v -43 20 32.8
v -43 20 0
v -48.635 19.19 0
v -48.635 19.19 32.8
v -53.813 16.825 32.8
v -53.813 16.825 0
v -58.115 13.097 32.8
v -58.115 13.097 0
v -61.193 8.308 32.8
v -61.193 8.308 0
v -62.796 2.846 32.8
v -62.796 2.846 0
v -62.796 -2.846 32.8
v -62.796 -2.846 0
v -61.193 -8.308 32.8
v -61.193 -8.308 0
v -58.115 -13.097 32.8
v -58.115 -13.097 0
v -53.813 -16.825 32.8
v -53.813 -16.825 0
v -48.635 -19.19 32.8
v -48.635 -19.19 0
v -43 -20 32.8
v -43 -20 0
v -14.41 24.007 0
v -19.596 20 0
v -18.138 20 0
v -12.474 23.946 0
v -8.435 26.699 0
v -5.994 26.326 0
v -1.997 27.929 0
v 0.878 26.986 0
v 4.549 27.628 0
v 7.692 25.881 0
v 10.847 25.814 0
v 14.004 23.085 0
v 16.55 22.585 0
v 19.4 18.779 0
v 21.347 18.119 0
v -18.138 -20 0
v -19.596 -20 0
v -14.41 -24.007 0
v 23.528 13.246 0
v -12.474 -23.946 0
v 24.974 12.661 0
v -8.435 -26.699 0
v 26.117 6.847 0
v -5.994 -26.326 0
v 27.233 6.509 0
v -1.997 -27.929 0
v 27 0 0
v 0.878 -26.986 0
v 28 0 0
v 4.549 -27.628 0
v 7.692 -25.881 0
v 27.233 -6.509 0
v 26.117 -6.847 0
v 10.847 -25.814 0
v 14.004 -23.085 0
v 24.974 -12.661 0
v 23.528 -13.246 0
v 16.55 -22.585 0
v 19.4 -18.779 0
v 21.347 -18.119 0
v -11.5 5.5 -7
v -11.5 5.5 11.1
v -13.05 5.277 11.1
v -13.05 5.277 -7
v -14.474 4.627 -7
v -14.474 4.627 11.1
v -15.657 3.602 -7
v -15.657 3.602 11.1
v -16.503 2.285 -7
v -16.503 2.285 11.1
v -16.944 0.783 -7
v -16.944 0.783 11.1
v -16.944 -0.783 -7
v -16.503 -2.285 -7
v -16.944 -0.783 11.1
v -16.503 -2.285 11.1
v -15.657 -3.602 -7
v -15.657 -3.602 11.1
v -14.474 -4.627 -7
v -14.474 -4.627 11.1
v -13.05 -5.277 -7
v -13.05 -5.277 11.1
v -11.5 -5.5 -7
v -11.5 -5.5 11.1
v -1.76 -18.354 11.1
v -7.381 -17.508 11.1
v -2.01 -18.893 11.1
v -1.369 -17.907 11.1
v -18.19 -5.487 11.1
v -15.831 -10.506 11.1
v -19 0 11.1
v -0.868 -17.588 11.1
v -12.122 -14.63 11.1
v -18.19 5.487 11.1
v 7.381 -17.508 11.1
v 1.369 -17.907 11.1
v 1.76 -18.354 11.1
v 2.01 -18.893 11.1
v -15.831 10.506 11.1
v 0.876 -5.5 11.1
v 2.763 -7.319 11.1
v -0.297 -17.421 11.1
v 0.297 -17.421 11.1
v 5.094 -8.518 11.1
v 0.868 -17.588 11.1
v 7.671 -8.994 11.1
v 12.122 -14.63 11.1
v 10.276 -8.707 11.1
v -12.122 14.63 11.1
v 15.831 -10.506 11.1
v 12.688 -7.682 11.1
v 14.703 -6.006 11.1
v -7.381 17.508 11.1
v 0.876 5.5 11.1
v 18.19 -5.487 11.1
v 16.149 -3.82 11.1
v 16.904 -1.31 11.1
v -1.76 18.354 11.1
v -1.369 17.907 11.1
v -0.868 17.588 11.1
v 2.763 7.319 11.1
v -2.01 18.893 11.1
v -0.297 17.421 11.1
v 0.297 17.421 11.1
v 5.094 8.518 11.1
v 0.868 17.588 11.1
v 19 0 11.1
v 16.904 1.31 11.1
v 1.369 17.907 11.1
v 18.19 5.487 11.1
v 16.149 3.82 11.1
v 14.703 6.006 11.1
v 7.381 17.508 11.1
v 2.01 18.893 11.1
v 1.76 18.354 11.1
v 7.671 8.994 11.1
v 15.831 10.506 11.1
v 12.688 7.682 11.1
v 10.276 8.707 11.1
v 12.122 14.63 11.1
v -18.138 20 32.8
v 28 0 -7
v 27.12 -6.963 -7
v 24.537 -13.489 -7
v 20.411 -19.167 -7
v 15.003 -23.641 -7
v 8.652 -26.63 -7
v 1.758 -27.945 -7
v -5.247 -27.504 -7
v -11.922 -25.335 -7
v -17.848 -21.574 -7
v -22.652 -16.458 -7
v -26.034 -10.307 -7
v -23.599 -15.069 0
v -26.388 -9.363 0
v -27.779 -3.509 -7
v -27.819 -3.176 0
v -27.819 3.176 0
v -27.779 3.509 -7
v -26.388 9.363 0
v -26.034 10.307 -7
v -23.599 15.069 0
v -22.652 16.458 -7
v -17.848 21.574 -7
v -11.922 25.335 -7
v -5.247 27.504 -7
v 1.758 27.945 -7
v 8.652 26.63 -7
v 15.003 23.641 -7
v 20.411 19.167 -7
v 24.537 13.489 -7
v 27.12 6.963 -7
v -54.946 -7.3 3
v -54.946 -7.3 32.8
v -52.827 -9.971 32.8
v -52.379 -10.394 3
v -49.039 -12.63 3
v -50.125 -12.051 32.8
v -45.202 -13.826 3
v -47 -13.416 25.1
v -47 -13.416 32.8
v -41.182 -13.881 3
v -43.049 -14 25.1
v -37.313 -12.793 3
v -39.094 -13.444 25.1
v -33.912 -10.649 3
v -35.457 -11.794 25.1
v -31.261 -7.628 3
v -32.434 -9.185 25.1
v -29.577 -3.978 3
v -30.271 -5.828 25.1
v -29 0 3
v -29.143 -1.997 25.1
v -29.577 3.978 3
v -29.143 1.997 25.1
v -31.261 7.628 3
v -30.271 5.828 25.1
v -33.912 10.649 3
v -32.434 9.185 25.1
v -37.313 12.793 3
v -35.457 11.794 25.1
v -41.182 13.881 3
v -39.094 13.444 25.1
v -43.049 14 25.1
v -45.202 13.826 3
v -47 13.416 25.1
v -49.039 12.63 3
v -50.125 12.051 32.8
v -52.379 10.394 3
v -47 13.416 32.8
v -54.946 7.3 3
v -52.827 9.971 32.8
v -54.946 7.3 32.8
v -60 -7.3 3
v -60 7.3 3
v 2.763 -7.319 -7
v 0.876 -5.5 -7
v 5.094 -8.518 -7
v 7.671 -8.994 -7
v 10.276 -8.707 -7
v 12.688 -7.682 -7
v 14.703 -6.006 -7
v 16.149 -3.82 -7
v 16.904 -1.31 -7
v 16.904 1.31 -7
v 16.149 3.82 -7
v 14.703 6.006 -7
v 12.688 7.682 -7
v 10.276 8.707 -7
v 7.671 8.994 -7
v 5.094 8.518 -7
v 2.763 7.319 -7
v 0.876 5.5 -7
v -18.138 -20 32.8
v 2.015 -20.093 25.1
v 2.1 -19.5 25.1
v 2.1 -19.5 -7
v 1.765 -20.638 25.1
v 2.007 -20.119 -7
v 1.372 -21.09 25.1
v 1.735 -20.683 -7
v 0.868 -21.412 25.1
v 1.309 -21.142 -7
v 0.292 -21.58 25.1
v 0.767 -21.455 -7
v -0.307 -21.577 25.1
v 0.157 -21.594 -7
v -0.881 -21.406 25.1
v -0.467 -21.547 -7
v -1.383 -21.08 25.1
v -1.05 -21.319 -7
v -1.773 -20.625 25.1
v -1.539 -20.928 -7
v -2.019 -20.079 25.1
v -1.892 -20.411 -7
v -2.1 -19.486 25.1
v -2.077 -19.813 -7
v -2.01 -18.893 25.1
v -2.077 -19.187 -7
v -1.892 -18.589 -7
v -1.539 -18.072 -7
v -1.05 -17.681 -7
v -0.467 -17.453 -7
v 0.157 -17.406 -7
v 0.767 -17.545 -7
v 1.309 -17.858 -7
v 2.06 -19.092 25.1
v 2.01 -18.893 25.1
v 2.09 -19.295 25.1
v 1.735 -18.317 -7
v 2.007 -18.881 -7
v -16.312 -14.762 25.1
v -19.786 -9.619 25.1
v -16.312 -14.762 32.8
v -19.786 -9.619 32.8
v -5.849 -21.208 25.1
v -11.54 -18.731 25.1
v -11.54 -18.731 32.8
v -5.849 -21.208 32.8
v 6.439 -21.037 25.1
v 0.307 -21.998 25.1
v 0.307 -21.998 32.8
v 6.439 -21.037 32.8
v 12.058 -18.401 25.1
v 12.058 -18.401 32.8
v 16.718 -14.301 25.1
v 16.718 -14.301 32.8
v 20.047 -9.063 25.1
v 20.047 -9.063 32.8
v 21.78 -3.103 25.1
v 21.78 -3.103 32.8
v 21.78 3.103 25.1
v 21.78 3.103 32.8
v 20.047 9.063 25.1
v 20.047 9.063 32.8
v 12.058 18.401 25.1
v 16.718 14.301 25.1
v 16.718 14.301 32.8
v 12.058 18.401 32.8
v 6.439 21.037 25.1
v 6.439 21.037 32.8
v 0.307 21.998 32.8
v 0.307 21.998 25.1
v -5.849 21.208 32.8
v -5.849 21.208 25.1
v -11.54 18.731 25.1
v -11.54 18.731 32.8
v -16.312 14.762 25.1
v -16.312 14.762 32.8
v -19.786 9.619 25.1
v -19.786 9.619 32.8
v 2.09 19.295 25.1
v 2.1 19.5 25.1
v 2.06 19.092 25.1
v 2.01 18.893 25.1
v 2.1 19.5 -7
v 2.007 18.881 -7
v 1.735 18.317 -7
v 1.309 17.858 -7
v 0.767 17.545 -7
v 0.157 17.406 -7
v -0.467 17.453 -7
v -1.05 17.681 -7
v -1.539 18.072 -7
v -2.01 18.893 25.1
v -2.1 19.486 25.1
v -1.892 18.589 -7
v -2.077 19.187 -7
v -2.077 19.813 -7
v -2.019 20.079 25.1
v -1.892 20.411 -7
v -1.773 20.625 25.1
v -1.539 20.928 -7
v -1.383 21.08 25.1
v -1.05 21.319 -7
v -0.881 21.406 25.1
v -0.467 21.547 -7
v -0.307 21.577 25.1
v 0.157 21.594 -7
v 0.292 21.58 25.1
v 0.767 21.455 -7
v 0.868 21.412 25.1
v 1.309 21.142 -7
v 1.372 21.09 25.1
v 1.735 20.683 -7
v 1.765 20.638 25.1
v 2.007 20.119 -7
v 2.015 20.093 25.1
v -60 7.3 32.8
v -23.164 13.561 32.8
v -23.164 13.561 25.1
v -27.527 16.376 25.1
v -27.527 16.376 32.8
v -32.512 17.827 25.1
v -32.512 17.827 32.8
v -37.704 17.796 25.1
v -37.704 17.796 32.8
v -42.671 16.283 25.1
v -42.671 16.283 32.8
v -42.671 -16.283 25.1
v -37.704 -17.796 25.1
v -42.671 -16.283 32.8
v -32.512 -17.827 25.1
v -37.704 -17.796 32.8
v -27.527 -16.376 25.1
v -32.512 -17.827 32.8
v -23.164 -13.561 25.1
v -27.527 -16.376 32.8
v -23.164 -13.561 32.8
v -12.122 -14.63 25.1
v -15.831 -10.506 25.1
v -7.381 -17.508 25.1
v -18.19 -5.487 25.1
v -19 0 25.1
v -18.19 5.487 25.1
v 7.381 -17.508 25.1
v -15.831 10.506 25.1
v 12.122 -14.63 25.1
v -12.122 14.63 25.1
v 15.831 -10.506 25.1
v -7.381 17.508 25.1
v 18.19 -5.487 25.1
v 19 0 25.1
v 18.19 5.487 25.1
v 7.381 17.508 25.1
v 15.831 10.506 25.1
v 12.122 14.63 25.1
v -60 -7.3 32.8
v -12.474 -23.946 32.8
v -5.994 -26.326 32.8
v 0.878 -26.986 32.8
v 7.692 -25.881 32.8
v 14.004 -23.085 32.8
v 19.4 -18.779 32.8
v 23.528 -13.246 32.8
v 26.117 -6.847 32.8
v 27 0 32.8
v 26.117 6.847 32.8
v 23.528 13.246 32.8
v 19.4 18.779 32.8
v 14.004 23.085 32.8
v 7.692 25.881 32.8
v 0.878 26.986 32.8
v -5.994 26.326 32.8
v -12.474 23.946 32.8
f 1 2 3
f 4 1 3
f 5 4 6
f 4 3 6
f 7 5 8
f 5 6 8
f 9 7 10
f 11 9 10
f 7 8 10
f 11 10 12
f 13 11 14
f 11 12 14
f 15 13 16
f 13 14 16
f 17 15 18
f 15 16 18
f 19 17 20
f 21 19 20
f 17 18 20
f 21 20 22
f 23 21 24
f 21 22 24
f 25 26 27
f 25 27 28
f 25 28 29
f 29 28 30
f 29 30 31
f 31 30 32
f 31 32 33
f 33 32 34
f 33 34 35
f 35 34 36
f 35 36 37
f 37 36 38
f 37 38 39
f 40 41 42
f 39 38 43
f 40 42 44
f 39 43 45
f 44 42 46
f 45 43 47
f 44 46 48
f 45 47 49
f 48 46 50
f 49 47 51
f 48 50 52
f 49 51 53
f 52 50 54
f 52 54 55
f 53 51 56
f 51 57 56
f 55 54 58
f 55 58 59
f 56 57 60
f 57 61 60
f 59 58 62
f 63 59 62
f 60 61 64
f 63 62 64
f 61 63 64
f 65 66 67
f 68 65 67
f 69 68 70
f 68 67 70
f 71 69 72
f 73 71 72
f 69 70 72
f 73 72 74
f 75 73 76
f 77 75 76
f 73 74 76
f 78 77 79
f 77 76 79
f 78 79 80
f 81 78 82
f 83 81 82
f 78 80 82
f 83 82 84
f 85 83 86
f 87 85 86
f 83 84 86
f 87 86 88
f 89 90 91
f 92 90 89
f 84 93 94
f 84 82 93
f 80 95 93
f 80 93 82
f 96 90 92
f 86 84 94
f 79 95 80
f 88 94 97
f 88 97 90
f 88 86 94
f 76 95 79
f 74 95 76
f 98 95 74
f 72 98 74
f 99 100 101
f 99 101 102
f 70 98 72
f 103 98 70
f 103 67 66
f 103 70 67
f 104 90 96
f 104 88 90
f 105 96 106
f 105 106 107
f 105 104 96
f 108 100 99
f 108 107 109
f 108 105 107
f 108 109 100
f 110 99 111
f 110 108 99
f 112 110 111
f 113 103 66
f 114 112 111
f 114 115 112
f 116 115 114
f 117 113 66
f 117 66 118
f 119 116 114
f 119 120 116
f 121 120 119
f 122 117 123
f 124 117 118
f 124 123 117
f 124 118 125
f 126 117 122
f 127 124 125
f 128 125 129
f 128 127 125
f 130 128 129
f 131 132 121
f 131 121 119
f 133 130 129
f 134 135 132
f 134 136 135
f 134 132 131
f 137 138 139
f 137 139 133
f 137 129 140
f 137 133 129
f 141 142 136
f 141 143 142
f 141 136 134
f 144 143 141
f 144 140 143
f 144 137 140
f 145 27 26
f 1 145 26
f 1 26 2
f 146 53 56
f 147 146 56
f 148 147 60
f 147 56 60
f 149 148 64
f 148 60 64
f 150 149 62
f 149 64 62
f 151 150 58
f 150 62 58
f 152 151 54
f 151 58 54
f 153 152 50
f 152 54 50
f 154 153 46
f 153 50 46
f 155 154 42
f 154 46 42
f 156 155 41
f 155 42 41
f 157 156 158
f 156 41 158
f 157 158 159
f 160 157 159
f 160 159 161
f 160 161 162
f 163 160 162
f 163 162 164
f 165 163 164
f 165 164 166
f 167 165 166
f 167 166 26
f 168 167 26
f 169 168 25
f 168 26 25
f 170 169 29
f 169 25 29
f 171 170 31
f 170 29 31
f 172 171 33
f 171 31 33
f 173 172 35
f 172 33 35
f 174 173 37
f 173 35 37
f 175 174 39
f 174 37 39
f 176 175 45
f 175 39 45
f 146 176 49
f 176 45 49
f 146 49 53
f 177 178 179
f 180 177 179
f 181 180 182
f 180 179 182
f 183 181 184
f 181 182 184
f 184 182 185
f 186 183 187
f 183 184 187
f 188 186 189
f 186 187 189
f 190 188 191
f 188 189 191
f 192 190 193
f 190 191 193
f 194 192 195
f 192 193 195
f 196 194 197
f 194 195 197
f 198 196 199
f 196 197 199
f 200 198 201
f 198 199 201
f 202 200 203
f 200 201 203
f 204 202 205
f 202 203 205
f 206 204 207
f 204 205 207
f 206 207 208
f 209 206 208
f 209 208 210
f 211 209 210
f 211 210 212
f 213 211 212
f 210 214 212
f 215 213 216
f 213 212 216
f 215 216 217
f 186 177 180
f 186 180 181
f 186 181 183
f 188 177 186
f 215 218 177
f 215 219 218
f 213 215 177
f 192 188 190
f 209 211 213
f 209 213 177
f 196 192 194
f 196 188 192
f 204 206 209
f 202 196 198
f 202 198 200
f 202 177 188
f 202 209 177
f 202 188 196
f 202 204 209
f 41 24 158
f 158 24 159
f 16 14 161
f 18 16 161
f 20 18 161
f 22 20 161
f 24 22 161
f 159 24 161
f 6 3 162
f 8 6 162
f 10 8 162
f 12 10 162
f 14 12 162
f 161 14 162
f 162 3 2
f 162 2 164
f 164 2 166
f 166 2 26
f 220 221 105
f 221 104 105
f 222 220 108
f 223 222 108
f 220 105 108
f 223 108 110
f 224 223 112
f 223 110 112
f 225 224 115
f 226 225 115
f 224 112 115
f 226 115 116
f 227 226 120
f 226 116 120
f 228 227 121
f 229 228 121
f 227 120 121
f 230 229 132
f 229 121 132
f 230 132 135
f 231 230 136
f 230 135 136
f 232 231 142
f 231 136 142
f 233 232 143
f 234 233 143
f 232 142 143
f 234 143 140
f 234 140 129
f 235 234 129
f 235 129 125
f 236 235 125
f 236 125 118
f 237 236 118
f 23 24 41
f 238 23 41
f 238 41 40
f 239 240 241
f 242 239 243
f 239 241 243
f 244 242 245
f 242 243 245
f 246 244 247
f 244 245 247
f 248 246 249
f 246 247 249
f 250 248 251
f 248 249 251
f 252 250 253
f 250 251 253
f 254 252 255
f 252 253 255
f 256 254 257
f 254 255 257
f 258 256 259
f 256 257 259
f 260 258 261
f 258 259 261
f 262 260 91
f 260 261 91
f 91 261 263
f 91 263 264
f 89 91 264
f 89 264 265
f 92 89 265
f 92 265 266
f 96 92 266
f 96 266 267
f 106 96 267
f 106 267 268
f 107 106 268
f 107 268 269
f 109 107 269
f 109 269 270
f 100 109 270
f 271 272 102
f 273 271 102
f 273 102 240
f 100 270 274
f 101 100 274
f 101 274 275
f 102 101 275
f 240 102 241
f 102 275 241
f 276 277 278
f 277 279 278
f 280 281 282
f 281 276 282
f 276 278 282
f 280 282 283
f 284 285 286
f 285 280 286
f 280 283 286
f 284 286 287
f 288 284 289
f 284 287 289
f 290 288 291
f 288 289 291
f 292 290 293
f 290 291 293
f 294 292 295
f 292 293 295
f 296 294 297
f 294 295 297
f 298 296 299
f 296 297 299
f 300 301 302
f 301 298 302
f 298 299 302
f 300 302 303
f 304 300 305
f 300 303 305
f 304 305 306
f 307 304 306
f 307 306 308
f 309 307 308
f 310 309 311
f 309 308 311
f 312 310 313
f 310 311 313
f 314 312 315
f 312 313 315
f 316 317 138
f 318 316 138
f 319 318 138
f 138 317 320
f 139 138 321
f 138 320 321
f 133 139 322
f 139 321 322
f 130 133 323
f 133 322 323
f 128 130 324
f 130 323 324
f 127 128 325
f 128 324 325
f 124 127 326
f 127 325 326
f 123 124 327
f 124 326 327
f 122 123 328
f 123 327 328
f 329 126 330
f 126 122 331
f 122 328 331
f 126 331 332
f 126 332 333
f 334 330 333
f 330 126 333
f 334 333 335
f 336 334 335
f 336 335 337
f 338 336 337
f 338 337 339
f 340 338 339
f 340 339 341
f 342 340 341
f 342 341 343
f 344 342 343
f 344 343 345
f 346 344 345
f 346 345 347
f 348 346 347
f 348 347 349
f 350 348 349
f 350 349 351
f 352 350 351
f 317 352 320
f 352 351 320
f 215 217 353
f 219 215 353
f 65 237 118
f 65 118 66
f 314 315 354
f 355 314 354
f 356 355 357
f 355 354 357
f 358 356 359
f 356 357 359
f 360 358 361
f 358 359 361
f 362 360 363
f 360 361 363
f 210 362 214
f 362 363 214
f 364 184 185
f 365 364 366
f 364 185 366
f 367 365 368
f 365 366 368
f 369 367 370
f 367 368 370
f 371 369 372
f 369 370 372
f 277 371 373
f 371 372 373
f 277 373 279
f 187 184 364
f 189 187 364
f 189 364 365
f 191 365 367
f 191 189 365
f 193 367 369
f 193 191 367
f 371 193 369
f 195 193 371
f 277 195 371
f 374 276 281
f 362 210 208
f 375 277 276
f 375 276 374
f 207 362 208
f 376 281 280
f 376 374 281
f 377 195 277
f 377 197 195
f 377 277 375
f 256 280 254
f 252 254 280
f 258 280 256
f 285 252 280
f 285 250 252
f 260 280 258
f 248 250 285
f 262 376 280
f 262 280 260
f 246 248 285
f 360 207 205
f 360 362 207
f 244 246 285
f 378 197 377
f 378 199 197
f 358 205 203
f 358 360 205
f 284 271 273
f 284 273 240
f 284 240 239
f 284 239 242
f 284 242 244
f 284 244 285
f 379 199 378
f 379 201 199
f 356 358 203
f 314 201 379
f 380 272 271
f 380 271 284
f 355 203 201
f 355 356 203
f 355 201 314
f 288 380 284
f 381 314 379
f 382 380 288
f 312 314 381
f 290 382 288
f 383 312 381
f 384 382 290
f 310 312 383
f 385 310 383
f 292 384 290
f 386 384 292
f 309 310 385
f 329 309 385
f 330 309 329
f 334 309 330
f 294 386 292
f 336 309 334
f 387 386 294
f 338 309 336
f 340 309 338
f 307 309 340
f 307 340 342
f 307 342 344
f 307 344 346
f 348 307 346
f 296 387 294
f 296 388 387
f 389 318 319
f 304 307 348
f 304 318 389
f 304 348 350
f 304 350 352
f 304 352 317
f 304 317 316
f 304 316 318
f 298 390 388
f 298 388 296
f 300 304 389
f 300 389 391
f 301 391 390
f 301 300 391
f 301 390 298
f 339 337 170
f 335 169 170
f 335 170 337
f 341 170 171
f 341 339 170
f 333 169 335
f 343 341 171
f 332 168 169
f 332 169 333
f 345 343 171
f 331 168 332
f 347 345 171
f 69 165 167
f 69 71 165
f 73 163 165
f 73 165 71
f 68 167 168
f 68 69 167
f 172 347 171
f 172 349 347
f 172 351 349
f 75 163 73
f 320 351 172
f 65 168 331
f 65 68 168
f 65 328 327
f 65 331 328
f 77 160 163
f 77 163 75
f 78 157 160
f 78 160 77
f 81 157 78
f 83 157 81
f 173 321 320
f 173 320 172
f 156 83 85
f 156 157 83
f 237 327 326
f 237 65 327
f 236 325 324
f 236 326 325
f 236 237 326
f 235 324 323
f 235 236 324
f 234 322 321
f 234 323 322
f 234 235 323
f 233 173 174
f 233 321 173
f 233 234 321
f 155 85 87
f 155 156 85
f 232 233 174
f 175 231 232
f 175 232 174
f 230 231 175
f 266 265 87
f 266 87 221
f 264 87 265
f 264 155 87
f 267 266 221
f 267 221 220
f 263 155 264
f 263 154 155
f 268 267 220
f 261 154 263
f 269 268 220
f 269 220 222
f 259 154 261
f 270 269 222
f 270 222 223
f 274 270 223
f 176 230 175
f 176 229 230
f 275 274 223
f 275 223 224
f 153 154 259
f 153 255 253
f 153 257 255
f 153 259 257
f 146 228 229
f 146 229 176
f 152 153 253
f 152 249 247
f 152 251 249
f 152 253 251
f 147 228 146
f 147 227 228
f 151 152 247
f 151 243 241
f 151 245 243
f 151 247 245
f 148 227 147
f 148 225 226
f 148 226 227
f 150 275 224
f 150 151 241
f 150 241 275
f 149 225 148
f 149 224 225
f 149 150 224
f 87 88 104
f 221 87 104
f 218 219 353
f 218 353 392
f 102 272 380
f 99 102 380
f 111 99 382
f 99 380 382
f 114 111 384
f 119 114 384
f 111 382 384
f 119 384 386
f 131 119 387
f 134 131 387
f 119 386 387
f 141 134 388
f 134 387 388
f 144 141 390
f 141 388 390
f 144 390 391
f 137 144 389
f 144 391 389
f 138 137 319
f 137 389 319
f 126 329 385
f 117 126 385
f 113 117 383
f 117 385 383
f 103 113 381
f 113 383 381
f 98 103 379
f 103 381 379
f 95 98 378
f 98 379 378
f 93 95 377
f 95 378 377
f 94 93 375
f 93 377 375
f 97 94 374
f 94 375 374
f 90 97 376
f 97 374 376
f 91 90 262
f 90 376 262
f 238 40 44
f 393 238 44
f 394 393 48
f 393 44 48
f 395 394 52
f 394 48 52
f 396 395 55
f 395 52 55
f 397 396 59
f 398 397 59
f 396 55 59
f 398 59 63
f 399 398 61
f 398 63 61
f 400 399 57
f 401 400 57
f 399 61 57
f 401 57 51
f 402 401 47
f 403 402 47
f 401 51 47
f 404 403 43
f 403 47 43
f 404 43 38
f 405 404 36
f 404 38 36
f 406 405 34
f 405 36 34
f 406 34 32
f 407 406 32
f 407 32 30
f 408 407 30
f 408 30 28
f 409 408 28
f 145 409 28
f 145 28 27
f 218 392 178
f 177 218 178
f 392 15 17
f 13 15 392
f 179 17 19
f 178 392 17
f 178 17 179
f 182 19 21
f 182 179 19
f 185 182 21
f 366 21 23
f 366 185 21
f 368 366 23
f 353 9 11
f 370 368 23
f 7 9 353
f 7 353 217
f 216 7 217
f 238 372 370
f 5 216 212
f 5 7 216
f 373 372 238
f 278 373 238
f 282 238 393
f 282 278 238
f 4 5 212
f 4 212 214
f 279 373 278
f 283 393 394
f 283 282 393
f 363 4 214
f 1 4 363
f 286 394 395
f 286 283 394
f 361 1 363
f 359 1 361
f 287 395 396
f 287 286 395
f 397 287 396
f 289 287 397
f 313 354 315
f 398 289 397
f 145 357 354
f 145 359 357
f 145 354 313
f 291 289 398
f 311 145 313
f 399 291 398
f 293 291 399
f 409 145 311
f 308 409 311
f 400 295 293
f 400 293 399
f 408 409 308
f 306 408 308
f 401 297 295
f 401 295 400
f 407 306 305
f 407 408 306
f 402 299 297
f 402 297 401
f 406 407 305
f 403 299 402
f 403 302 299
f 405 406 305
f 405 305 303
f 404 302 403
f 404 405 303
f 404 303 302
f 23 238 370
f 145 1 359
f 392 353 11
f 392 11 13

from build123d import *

# Parameters (mm, degrees)
F1_DEPTH  = 32.8
F2_R      = 22
F3_DEPTH  = 7.7
F4_R      = 19
F5_DEPTH  = 14
F7_DEPTH  = 29.8
F8_R      = 18
F9_DEPTH  = 7.7
F10_R     = 28
F11_DEPTH = 7
F12_R     = 2.1
F13_DEPTH = 39.801
F14_DEPTH = 11.1


with BuildPart() as f1:
    # F0 (on Top) → F1 (new body)
    with BuildSketch(Plane.XY):
        with BuildLine():
            Line((-43, -20), (-18.1383571472, -20))
            ThreePointArc((-18.1383571472, -20), (27, 0), (-18.1383571472, 20))
            Line((-18.1383571472, 20), (-43, 20))
            ThreePointArc((-43, 20), (-63, 0), (-43, -20))
        make_face()
    extrude(amount=F1_DEPTH)

    # F2 (on face) → F3 (cut)
    with BuildSketch(Plane.XY.offset(32.8)):
        Circle(F2_R)
    extrude(amount=-F3_DEPTH, mode=Mode.SUBTRACT)

    # F4 (on face) → F5 (cut)
    with BuildSketch(Plane.XY.offset(25.1)):
        Circle(F4_R)
    extrude(amount=-F5_DEPTH, mode=Mode.SUBTRACT)

    # F6 (on face) → F7 (cut)
    with BuildSketch(Plane.XY.offset(32.8)):
        with BuildLine():
            Line((-60, -7.3), (-54.9461290802, -7.3))
            ThreePointArc((-54.9461290802, -7.3), (-29, 0), (-54.9461290802, 7.3))
            Line((-54.9461290802, 7.3), (-60, 7.3))
            Line((-60, 7.3), (-60, -7.3))
        make_face()
    extrude(amount=-F7_DEPTH, mode=Mode.SUBTRACT)

    # F8 (on face) → F9 (cut)
    with BuildSketch(Plane.XY.offset(32.8)):
        with Locations((-35, 0)):
            Circle(F8_R)
    extrude(amount=-F9_DEPTH, mode=Mode.SUBTRACT)

    # F10 (on face) → F11 (join)
    with BuildSketch(Plane(origin=(0, 0, 0), x_dir=(1, 0, 0), z_dir=(0, 0, -1))):
        Circle(F10_R)
        with BuildLine():
            ThreePointArc((0.8760965756, 5.5), (17, 0), (0.8760965756, -5.5))
            Line((0.8760965756, -5.5), (-11.4999995261, -5.5))
            ThreePointArc((-11.4999995261, -5.5), (-17, 0), (-11.4999995261, 5.5))
            Line((-11.4999995261, 5.5), (0.8760965756, 5.5))
        make_face(mode=Mode.SUBTRACT)
    extrude(amount=F11_DEPTH)

    # F12 (on face) → F13 (cut, through all)
    with BuildSketch(Plane(origin=(0, 0, -7), x_dir=(1, 0, 0), z_dir=(0, 0, -1))):
        with Locations((0, -19.5)):
            Circle(F12_R)
        with Locations((0, 19.5)):
            Circle(F12_R)
    extrude(amount=-F13_DEPTH, mode=Mode.SUBTRACT)

    # F14 (cut, through all): a face of the model
    f14_faces = [f1.faces().sort_by_distance(p)[0] for p in [
        (1.5412658512, 0, 0),
    ]]
    extrude(f14_faces, amount=-F14_DEPTH, mode=Mode.SUBTRACT)


solid = f1.part
